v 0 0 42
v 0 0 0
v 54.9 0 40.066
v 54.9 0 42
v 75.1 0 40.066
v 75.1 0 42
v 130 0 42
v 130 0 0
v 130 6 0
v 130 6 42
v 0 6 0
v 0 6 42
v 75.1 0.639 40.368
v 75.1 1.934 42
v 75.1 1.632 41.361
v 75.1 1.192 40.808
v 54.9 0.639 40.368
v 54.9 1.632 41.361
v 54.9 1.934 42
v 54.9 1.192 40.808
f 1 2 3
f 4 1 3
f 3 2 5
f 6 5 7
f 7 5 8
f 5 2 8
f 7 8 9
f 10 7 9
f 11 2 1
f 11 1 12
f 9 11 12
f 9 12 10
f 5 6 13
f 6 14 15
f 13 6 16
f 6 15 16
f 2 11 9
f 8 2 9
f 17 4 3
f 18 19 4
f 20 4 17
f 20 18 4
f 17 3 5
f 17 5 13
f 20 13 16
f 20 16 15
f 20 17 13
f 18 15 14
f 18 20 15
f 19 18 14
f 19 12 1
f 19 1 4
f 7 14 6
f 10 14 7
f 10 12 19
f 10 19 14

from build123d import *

# Parameters (mm, degrees)
HINGE_CUT_R           = 3.1
HINGE_CUT_DEPTH       = 20.2
SIDE_HINGE_MAIN_W     = 130
SIDE_HINGE_MAIN_H     = 6
SIDE_HINGE_MAIN_DEPTH = 42


with BuildPart() as hinge_cut:
    # hinge_cut → hinge_cut (new body)
    with BuildSketch(Plane(origin=(54.9, -1, 43), x_dir=(0, 0, -1), z_dir=(1, 0, 0))):
        Circle(HINGE_CUT_R)
    extrude(amount=HINGE_CUT_DEPTH)


with BuildPart() as side_main_cut:
    # side_hinge_main → side_hinge_main (new body)
    with BuildSketch(Plane.XY):
        with Locations((65, 3)):
            Rectangle(SIDE_HINGE_MAIN_W, SIDE_HINGE_MAIN_H)
    extrude(amount=SIDE_HINGE_MAIN_DEPTH)

    # side_main_cut: cut hinge_cut
    add(hinge_cut.part, mode=Mode.SUBTRACT)


solid = side_main_cut.part
